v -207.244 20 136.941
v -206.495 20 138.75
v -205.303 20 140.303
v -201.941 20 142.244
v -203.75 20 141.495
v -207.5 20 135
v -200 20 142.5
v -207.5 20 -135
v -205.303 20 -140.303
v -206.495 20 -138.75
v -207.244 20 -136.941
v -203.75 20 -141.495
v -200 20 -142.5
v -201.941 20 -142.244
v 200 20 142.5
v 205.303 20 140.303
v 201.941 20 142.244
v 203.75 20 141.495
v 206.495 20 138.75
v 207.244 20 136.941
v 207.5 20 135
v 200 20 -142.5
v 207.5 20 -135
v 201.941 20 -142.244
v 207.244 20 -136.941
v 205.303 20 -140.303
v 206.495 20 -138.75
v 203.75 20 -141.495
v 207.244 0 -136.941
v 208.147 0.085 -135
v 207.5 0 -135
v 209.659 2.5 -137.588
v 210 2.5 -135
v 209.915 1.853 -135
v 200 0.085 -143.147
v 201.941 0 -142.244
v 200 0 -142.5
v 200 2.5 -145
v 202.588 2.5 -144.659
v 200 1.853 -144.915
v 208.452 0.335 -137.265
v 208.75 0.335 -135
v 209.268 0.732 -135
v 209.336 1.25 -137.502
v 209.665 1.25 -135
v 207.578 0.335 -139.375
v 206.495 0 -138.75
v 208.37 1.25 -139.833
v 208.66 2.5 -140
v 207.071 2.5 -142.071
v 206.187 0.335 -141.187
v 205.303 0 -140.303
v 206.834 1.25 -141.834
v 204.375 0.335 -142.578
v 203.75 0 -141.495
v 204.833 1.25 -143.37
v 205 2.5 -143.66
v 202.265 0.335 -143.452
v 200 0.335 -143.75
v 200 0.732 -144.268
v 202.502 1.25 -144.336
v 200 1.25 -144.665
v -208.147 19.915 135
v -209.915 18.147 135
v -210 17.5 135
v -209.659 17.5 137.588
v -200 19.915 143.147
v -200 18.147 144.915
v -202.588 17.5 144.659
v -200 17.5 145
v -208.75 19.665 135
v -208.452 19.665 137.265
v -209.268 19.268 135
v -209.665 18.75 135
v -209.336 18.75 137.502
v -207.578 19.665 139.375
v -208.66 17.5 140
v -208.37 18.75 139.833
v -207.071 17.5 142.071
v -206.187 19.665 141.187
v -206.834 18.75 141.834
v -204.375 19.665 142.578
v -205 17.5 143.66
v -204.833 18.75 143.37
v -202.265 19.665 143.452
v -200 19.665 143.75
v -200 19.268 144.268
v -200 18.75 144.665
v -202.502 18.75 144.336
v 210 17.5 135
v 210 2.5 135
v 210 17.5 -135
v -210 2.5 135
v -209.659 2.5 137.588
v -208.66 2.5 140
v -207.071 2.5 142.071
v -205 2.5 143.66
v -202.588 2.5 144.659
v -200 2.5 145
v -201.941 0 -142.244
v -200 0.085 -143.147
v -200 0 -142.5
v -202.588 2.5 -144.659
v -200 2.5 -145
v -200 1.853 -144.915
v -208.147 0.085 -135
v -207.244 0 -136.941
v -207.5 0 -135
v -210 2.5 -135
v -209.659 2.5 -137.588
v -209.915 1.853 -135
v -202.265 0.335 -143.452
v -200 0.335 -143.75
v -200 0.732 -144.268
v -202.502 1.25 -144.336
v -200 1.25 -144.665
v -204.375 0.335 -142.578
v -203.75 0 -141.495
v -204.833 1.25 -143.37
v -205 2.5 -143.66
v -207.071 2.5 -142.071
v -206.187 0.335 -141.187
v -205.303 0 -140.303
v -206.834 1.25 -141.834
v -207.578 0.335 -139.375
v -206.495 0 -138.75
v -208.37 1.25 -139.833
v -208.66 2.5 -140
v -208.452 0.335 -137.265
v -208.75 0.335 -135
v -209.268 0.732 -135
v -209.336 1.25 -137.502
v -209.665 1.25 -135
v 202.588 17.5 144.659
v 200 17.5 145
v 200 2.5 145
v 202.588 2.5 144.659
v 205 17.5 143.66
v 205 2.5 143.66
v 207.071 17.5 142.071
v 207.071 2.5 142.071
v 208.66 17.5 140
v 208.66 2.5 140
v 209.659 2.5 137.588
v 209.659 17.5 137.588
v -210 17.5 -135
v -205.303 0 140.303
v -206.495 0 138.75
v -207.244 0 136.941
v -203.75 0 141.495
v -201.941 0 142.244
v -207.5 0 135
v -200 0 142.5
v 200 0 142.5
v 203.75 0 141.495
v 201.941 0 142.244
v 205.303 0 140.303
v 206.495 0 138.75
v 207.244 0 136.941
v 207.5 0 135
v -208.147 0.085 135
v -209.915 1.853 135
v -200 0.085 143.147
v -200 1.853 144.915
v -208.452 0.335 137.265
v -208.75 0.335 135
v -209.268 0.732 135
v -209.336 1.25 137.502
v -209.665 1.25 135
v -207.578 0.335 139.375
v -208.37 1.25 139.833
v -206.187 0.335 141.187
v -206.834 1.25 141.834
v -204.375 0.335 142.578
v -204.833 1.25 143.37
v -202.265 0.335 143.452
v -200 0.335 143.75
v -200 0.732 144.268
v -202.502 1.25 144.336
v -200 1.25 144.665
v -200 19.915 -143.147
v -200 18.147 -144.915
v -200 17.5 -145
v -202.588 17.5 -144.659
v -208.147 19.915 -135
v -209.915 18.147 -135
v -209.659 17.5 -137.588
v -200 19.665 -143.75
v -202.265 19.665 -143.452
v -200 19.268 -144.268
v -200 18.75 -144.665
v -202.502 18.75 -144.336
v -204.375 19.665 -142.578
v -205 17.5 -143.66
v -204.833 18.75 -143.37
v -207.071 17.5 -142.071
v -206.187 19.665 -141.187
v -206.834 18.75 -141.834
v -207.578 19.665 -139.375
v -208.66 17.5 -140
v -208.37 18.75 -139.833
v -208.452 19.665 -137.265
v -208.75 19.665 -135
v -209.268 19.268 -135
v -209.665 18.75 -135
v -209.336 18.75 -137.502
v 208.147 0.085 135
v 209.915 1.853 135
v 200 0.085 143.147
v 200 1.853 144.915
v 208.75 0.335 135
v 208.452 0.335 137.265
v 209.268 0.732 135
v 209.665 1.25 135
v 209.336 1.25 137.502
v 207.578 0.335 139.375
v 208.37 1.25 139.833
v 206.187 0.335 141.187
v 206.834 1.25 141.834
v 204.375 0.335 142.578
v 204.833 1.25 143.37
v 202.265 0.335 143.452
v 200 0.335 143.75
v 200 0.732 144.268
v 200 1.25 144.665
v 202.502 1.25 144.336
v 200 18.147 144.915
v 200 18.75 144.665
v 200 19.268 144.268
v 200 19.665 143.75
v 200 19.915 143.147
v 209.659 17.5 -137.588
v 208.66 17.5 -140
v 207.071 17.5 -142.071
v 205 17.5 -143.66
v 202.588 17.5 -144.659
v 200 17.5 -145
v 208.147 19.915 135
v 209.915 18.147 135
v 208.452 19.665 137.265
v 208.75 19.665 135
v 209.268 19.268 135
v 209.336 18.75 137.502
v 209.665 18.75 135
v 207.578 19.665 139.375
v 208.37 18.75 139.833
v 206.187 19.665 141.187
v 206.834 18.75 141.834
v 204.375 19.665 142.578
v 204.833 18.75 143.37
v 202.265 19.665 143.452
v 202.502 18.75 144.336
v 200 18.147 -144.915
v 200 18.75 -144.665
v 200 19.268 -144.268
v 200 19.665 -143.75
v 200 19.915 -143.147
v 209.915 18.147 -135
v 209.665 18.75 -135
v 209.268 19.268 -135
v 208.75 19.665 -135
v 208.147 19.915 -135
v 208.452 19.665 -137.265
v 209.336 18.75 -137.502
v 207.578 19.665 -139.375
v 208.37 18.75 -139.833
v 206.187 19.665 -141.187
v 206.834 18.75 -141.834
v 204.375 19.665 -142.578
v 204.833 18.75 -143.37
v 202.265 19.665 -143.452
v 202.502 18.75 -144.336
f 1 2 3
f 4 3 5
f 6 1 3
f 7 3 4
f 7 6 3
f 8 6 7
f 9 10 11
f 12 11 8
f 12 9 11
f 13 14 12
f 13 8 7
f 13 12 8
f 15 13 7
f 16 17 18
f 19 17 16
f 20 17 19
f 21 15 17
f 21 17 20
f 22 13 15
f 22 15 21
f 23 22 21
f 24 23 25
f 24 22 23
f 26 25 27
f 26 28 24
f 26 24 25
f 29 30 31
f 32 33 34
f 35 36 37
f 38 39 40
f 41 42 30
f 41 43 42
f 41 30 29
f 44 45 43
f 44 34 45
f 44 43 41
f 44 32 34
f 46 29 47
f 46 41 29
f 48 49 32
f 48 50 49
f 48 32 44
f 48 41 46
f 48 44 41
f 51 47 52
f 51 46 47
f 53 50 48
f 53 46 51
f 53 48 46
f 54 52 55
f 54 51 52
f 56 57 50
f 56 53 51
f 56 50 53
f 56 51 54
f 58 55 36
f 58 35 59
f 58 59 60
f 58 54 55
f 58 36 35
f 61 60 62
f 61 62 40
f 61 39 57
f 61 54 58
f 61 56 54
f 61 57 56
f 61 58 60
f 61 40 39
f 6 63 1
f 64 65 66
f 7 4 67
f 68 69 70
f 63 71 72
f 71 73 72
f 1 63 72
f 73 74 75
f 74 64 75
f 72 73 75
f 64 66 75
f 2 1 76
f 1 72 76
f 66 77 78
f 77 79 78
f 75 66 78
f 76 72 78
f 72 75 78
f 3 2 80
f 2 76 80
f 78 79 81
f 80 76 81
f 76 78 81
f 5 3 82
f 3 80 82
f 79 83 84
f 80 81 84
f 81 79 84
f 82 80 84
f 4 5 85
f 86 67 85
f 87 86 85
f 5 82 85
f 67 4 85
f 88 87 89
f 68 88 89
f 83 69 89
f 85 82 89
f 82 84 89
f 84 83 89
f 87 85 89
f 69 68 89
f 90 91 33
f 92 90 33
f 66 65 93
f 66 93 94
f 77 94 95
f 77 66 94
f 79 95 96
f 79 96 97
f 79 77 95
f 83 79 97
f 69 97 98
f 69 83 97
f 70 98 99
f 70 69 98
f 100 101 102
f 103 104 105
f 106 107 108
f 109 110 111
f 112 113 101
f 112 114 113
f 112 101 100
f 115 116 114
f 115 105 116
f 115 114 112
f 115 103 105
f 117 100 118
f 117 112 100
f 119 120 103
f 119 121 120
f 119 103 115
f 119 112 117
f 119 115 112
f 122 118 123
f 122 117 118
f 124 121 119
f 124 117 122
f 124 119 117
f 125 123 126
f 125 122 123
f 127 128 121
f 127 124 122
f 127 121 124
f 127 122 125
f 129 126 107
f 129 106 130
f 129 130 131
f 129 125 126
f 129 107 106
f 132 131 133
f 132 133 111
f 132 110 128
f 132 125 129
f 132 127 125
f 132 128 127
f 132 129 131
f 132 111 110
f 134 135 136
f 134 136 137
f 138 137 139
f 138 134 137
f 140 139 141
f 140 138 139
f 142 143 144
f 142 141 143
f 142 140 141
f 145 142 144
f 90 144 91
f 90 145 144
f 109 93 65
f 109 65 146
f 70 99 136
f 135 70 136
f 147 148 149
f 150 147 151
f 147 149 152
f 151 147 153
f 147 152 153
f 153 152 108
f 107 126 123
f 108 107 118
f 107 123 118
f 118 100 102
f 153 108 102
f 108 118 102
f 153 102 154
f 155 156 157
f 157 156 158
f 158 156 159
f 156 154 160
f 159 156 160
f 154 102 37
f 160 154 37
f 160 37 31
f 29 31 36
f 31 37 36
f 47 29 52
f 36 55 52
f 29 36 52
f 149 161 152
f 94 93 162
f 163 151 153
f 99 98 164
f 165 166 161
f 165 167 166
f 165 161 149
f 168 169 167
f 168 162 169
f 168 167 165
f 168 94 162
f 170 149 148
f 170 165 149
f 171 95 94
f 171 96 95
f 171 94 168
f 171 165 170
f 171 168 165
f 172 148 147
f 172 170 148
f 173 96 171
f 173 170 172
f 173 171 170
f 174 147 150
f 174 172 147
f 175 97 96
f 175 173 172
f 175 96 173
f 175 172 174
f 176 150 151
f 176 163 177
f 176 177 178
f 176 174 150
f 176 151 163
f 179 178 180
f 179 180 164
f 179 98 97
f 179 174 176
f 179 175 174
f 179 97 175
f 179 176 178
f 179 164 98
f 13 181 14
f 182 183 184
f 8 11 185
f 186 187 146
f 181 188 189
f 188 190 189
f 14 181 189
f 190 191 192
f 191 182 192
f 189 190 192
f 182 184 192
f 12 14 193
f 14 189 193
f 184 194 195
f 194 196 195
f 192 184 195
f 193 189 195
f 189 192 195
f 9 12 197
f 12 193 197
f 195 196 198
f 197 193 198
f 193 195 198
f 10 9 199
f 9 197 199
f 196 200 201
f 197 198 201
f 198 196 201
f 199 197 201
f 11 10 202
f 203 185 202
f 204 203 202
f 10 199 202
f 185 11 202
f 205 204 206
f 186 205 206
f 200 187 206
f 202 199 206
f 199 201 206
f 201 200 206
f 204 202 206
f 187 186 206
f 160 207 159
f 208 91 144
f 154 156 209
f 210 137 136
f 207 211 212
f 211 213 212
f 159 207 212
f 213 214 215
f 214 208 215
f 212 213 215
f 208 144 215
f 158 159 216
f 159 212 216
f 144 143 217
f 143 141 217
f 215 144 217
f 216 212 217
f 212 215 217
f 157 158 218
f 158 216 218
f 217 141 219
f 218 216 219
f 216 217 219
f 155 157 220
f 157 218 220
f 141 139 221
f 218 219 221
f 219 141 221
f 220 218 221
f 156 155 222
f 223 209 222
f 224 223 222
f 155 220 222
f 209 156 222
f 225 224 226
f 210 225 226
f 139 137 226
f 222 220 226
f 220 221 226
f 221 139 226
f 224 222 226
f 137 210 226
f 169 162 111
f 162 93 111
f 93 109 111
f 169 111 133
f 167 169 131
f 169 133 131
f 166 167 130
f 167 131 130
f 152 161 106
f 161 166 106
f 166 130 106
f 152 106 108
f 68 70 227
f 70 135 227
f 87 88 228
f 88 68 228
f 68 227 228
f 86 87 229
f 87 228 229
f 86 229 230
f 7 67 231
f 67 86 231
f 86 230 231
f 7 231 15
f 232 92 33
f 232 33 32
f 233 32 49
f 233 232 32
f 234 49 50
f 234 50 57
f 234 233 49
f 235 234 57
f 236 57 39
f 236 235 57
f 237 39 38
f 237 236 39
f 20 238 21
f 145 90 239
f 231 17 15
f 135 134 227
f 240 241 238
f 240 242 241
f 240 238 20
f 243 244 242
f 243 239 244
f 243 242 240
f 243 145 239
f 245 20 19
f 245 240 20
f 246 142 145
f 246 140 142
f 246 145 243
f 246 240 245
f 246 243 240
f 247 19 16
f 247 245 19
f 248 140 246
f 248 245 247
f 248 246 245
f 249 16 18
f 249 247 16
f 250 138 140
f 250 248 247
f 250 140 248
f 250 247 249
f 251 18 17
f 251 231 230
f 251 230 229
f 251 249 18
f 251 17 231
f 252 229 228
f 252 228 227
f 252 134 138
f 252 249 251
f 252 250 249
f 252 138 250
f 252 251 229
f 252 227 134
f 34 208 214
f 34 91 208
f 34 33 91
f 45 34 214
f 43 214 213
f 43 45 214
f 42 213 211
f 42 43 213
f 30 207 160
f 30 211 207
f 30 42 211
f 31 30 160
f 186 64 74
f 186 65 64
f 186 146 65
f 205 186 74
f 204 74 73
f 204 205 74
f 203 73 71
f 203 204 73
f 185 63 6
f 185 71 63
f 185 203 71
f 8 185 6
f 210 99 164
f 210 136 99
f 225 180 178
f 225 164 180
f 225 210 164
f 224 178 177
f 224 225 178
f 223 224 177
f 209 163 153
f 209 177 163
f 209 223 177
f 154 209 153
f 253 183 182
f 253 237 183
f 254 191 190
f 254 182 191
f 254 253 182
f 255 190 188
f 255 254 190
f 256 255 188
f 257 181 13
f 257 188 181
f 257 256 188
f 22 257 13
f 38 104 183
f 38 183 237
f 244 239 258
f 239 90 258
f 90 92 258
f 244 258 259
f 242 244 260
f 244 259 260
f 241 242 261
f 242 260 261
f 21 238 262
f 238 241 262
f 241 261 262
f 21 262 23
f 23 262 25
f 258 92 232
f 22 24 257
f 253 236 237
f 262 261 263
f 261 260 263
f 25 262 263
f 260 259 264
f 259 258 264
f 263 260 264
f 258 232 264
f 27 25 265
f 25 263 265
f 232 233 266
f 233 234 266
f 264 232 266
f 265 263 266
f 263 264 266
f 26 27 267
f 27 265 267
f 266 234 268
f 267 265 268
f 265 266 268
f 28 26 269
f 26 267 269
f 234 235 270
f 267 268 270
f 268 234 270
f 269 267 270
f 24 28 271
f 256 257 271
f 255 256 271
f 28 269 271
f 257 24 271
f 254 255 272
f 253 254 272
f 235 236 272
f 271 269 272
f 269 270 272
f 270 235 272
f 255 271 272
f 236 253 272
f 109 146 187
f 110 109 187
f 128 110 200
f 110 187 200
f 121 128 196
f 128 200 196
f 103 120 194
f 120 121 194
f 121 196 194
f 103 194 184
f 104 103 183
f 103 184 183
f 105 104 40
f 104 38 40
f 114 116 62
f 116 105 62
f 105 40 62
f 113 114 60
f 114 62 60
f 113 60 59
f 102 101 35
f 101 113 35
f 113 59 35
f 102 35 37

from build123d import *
from OCP.BRepFilletAPI import BRepFilletAPI_MakeFillet

# Parameters (mm, degrees)
SKETCH1_W           = 420
SKETCH1_H           = 290
BOSS_EXTRUDE1_DEPTH = 20
FILLET1_R1          = 10
FILLET1_R2          = 2.5


with BuildPart() as part:
    # Sketch1 → Boss-Extrude1 (new body)
    with BuildSketch(Plane(origin=(0, 0, 0), x_dir=(1, 0, 0), z_dir=(0, 1, 0))):
        Rectangle(SKETCH1_W, SKETCH1_H)
    extrude(amount=BOSS_EXTRUDE1_DEPTH)

    # Fillet1: one fillet with a radius per group of edges: ONE call of the kernel's fillet builder (fillet() takes one radius for all edges)
    fillet1_edges_1 = [part.edges().sort_by_distance(p)[0] for p in [
        (210, 10, 145),
        (-210, 10, 145),
        (-210, 10, -145),
        (210, 10, -145),
    ]]
    fillet1_edges_2 = [part.edges().sort_by_distance(p)[0] for p in [
        (210, 20, 0),
        (210, 0, 0),
        (0, 20, -145),
        (0, 0, -145),
        (-210, 20, 0),
        (-210, 0, 0),
        (0, 20, 145),
        (0, 0, 145),
    ]]
    fillet1 = BRepFilletAPI_MakeFillet(part.part.solid().wrapped)
    for e in fillet1_edges_1:
        fillet1.Add(FILLET1_R1, e.wrapped)
    for e in fillet1_edges_2:
        fillet1.Add(FILLET1_R2, e.wrapped)
    add(Compound.cast(fillet1.Shape()), mode=Mode.REPLACE)


solid = part.part
